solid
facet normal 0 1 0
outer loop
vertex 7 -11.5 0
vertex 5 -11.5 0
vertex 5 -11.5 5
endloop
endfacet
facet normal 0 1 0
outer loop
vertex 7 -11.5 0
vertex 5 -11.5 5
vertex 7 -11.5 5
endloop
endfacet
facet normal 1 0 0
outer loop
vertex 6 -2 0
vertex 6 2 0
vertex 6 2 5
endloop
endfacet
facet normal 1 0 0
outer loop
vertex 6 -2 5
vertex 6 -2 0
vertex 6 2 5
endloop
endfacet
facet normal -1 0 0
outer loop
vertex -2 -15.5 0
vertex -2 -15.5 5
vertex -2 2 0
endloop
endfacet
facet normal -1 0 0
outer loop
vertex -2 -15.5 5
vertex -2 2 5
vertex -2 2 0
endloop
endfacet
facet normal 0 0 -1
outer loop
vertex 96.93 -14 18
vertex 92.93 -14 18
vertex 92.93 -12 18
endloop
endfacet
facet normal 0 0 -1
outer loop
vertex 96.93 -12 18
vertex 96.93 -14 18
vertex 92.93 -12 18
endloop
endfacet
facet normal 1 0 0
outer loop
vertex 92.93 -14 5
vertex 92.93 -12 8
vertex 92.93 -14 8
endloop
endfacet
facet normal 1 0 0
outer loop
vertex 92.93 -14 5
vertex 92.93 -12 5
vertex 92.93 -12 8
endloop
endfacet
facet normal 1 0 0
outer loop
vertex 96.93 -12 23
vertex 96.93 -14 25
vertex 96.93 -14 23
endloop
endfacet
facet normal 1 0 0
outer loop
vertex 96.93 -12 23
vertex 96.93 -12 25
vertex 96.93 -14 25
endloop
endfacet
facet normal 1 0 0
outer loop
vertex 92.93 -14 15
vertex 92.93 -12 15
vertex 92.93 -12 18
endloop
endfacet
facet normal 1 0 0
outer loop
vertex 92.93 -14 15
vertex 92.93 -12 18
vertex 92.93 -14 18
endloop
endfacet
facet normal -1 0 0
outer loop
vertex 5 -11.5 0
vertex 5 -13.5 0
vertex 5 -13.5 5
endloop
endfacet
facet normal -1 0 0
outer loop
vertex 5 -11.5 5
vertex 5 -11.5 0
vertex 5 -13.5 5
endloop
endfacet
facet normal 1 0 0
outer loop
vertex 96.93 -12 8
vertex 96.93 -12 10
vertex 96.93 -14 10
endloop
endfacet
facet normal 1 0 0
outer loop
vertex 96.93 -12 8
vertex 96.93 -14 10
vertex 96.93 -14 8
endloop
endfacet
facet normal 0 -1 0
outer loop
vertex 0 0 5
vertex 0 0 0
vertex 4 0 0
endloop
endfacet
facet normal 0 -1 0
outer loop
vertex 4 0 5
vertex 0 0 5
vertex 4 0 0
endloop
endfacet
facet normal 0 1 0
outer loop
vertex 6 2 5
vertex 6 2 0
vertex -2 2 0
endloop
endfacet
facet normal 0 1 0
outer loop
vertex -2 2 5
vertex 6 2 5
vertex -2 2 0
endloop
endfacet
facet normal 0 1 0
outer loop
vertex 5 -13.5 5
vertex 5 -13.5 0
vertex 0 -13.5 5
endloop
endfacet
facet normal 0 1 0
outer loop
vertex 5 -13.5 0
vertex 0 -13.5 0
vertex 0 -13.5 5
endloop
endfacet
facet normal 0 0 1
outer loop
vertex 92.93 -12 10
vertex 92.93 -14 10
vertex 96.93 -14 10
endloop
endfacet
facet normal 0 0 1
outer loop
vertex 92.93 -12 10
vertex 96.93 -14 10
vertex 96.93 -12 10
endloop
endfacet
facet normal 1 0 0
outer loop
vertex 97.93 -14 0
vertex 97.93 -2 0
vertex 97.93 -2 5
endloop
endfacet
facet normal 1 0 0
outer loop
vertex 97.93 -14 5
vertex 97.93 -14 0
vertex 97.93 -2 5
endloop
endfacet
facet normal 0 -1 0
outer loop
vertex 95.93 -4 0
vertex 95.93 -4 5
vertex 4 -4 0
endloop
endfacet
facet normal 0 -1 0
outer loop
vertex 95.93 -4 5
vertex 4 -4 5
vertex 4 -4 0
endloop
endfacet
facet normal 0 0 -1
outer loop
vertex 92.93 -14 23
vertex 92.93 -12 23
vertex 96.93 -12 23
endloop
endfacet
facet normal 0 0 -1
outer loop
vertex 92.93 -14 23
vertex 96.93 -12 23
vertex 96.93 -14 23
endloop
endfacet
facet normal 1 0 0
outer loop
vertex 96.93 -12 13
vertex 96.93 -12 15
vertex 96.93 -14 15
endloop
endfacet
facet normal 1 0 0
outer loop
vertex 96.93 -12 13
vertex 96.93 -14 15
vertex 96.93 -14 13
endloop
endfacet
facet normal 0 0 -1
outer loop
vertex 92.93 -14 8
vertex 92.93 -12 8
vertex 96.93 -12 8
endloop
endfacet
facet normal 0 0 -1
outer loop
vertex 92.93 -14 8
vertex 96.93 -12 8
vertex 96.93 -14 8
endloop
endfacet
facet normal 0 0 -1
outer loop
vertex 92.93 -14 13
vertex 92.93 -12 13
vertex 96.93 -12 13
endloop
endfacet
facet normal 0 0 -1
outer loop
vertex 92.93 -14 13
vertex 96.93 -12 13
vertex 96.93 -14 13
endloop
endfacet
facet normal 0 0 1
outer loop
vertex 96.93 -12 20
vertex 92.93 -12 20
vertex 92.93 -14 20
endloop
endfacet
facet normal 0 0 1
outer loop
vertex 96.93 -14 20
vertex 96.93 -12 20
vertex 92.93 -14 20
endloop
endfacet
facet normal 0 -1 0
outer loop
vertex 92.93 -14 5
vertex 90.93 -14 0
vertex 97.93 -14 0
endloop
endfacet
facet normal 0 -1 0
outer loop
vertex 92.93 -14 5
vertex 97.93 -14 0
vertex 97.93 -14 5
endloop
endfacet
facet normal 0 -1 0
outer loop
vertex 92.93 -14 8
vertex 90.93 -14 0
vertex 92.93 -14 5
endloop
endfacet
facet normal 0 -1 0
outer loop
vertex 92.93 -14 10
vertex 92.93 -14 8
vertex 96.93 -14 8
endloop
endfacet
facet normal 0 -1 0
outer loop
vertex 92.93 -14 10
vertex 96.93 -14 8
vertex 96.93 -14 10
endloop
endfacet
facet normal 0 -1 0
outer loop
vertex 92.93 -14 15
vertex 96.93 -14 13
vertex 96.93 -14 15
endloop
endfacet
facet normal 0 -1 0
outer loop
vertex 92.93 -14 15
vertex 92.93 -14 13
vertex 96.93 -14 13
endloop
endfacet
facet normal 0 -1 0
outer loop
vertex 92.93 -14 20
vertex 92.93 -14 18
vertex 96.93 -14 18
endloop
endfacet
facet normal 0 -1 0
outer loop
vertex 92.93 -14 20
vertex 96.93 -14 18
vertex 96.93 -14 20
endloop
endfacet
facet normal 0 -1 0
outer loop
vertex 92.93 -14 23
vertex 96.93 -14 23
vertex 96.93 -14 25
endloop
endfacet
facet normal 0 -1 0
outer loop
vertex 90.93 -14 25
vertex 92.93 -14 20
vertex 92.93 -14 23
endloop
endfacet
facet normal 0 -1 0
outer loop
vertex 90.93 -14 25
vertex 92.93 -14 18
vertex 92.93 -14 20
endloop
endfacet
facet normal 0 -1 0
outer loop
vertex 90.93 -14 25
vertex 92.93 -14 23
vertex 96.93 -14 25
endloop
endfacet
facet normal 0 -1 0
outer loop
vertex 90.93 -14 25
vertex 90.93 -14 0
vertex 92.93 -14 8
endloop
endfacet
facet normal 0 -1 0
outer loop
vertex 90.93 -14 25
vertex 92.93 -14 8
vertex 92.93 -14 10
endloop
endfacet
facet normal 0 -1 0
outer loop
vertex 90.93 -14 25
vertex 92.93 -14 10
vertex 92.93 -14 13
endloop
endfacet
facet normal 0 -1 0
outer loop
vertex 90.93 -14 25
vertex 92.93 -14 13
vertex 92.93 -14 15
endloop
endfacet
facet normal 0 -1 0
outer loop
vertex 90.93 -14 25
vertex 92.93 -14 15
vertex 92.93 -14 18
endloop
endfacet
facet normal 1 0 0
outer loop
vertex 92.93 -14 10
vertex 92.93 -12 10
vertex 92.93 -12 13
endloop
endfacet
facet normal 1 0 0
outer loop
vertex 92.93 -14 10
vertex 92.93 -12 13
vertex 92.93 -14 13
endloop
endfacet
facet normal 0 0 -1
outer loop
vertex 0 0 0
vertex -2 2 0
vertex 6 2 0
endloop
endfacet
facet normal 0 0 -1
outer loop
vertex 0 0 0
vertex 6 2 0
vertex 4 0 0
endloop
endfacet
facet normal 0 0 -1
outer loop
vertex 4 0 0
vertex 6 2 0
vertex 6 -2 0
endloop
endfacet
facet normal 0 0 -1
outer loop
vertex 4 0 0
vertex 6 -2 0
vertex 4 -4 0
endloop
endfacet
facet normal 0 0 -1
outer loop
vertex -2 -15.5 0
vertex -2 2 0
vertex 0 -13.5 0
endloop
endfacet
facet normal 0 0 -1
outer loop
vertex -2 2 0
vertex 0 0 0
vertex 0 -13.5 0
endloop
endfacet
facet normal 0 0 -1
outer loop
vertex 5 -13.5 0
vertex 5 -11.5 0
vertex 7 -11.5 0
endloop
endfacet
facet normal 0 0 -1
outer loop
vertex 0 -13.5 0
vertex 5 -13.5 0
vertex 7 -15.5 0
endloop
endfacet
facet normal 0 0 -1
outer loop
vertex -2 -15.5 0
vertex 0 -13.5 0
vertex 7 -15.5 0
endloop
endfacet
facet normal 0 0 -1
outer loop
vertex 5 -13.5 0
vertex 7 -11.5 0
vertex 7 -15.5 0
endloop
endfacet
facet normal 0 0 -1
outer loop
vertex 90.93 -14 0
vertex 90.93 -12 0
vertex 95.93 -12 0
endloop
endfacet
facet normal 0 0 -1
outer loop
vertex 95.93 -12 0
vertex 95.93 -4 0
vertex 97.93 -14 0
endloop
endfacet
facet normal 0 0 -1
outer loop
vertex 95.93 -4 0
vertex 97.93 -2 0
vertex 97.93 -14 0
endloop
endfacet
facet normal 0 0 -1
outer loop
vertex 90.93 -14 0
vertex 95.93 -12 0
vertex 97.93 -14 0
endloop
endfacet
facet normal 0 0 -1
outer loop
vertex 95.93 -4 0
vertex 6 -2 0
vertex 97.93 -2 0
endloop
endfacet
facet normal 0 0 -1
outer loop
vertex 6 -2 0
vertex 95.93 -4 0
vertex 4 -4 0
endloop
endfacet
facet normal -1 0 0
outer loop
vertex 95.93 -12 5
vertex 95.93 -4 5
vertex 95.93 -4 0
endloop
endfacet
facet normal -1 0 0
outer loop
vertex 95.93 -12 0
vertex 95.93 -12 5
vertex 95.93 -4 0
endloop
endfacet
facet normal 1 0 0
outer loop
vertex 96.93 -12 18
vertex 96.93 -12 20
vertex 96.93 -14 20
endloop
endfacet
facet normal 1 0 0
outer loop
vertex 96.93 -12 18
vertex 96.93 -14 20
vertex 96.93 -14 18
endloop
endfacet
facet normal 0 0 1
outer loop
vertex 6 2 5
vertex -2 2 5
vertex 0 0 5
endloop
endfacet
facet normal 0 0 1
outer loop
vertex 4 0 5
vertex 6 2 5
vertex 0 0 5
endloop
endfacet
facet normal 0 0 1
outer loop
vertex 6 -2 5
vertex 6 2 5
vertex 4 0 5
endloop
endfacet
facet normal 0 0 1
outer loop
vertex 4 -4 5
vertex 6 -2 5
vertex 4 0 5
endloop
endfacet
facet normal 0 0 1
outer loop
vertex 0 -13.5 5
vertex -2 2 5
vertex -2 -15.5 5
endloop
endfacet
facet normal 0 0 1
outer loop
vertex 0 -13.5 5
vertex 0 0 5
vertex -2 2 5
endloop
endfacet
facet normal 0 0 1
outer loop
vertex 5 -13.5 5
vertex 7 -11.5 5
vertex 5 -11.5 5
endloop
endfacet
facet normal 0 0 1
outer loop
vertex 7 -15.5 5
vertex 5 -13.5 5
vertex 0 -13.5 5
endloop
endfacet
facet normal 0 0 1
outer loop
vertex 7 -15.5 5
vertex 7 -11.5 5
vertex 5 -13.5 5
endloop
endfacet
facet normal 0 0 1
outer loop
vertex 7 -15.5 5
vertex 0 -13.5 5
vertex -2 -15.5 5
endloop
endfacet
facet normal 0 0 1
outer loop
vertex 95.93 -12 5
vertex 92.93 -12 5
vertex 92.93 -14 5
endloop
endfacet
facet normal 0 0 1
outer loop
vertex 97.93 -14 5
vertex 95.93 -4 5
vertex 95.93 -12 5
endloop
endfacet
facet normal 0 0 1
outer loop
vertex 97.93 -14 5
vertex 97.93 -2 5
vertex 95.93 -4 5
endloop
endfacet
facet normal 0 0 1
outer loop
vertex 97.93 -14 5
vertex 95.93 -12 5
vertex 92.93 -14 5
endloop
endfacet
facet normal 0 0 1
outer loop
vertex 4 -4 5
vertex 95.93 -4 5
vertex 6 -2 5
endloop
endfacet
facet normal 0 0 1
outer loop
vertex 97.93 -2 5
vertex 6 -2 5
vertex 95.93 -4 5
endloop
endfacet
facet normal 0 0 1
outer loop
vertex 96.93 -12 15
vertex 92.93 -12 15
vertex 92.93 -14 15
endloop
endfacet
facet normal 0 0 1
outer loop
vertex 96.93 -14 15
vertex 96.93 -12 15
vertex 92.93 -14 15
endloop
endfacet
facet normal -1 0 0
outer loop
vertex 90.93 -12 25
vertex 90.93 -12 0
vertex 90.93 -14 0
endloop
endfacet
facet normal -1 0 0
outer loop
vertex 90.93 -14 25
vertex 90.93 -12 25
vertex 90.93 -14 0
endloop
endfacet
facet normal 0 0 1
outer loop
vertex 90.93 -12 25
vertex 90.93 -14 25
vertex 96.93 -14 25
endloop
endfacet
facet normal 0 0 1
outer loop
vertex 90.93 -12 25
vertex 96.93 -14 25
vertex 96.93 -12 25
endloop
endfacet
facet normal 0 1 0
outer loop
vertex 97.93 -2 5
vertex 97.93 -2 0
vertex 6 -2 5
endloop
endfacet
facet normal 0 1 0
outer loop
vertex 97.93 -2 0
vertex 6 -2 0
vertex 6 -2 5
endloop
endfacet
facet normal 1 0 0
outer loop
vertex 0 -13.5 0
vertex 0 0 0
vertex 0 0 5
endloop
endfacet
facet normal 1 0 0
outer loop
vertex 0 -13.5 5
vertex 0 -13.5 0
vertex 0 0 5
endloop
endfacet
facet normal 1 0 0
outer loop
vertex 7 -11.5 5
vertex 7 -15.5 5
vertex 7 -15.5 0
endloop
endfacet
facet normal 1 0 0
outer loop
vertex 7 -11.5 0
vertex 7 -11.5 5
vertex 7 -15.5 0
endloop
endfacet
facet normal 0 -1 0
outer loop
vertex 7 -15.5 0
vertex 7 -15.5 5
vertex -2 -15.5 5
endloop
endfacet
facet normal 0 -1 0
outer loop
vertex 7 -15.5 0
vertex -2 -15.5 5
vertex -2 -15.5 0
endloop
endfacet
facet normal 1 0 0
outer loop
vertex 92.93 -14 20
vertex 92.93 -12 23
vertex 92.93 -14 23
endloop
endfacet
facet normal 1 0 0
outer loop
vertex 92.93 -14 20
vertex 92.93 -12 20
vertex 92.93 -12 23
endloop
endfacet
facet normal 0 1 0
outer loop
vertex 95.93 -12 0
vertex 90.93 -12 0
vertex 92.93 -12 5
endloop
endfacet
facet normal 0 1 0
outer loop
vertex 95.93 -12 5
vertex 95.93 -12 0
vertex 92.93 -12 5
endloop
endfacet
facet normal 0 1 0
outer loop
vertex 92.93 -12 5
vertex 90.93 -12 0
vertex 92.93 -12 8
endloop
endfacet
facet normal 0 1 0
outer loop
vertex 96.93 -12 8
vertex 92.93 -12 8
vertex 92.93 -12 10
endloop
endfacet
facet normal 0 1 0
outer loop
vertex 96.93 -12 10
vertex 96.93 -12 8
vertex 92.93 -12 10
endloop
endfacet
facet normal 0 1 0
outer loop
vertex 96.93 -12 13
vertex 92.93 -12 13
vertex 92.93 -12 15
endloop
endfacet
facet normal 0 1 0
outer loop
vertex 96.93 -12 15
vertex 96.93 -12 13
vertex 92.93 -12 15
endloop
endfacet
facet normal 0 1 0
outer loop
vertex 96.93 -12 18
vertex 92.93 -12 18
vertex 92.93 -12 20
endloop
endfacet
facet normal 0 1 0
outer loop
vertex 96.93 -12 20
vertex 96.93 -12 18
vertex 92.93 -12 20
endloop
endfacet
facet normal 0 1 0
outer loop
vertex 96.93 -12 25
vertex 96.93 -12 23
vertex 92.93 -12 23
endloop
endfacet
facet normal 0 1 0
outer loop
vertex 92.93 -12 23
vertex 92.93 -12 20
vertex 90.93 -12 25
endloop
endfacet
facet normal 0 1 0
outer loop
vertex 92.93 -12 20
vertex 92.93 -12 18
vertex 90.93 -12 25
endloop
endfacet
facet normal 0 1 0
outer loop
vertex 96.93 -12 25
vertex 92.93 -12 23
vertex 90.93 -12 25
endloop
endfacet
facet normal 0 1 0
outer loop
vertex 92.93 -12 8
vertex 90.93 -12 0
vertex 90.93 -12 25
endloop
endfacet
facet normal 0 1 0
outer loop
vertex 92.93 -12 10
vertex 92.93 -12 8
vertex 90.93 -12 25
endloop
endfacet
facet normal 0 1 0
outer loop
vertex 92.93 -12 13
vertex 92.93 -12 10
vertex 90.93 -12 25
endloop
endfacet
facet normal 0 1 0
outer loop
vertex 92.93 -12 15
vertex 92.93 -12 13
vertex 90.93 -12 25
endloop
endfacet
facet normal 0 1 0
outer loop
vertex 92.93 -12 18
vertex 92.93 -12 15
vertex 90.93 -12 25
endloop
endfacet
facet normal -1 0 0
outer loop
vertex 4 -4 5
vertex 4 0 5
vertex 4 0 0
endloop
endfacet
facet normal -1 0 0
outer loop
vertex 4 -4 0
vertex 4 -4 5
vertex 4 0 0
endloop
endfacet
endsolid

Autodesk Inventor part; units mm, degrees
ref_plane "YZ Plane" through (0, 0, 0) normal (1, 0, 0) x (0, 1, 0)
ref_plane "XZ Plane" through (0, 0, 0) normal (0, 1, 0) x (-1, 0, 0)
ref_plane "XY Plane" through (0, 0, 0) normal (0, 0, 1) x (1, 0, 0)
sketch "Sketch1" plane through (0, 0, 0) normal (0, 0, 1) x (1, 0, 0)
  line L0 (0, 0) -> (6, 0)
  line L1 (6, 0) -> (6, 2)
  line L2 (6, 2) -> (0, 2)
  line L3 (0, 2) -> (0, 0)
  dimension "d0" = 6
  dimension "d1" = 2
extrude "Extrusion1" add sketch "Sketch1" along normal blind 5
sketch "Sketch2" plane through (0, 0, 0) normal (-1, 0, 0) x (0, 0, 1)
  line L0 (0, 2) -> (0, 0) projected
  line L1 (0, 0) -> (5, 0) projected
  line L2 (5, 2) -> (5, 0) projected
  line L3 (0, 2) -> (5, 2) projected
extrude "Extrusion2" add sketch "Sketch2" along normal blind 2
sketch "Sketch3" plane through (6, 0, 0) normal (0, -1, 0) x (1, 0, 0)
  line L0 (-8, 5) -> (-6, 5)
  line L1 (-6, 5) -> (-6, 0)
  line L2 (-6, 0) -> (-8, 0)
  line L3 (-8, 0) -> (-8, 5)
extrude "Extrusion3" add sketch "Sketch3" along normal blind 10.5
sketch "Sketch5" plane through (6, 0, 0) normal (0, -1, 0) x (1, 0, 0)
  line L0 (0, 5) -> (-8, 5) projected
  line L1 (0, 0) -> (-8, 0) projected
  line L2 (0, 5) -> (-2, 5)
  line L3 (-2, 5) -> (-2, 0)
  line L4 (-2, 0) -> (0, 0)
  line L5 (0, 0) -> (0, 5)
extrude "Extrusion5" add sketch "Sketch5" along normal blind 4
sketch "Sketch6" plane through (6, 2, 5) normal (1, 0, 0) x (0, 0, -1)
  line L0 (0, -6) -> (5, -6) projected
  line L1 (5, -2) -> (5, -12.5) projected
  line L2 (0, -6) -> (5, -6)
  line L3 (5, -6) -> (5, -4)
  line L4 (5, -4) -> (0, -4)
  line L5 (0, -4) -> (0, -6)
  dimension "d13" = 2
extrude "Extrusion6" add sketch "Sketch6" along normal blind 89.93
sketch "Sketch7" plane through (95.93, 2, 5) normal (1, 0, 0) x (0, 0, -1)
  line L0 (0, -6) -> (5, -6) projected
  line L1 (5, -6) -> (5, -4) projected
  line L2 (5, -4) -> (0, -4) projected
  line L3 (0, -4) -> (0, -6) projected
  point P0 (5, -2)
extrude "Extrusion7" add sketch "Sketch7" along normal blind 2
sketch "Sketch8" plane through (6, -4, 0) normal (0, -1, 0) x (1, 0, 0)
  line L0 (-2, 0) -> (91.93, 0) projected
  line L1 (91.93, 5) -> (89.93, 5)
  line L2 (89.93, 5) -> (89.93, 0)
  line L3 (89.93, 0) -> (91.93, 0)
  line L4 (91.93, 0) -> (91.93, 5)
  point P0 (-6, 0)
  dimension "d18" = 2
extrude "Extrusion8" add sketch "Sketch8" along normal blind 10
sketch "Sketch9" plane through (6, -10.5, 0) normal (0, -1, 0) x (1, 0, 0)
  line L0 (-6, 0) -> (-6, 5) projected
  line L1 (-6, 5) -> (-8, 5) projected
  line L2 (-8, 5) -> (-8, 0) projected
  line L3 (-8, 0) -> (-6, 0) projected
extrude "Extrusion9" add sketch "Sketch9" along normal blind 5
sketch "Sketch10" plane through (0, 0, 5) normal (1, 0, 0) x (0, 0, -1)
  line L0 (0, 2) -> (0, -15.5) projected
  line L1 (5, 2) -> (5, -15.5) projected
  line L2 (0, -15.5) -> (5, -15.5)
  line L3 (5, -15.5) -> (5, -13.5)
  line L4 (5, -13.5) -> (0, -13.5)
  line L5 (0, -13.5) -> (0, -15.5)
  dimension "d23" = 2
extrude "Extrusion10" add sketch "Sketch10" along normal blind 5
sketch "Sketch11" plane through (5, 0, 5) normal (1, 0, 0) x (0, 0, -1)
  line L0 (0, -15.5) -> (5, -15.5) projected
  line L1 (5, -15.5) -> (5, -13.5) projected
  line L2 (5, -13.5) -> (0, -13.5) projected
  line L3 (0, -13.5) -> (0, -15.5) projected
  point P0 (5, 0)
extrude "Extrusion11" add sketch "Sketch11" along normal blind 2
sketch "Sketch12" plane through (0, -13.5, 5) normal (0, 1, 0) x (1, 0, 0)
  line L0 (0, 0) -> (7, 0) projected
  line L1 (7, 5) -> (5, 5)
  line L2 (5, 5) -> (5, 0)
  line L3 (5, 0) -> (7, 0)
  line L4 (7, 0) -> (7, 5)
  dimension "d28" = 2
extrude "Extrusion12" add sketch "Sketch12" along normal blind 2
sketch "Sketch13" plane through (95.93, -4, 0) normal (-1, 0, 0) x (0, 0, 1)
  line L0 (5, 0) -> (5, -10) projected
  line L1 (0, -10) -> (5, -10)
  line L2 (5, -10) -> (5, -8)
  line L3 (5, -8) -> (0, -8)
  line L4 (0, -8) -> (0, -10)
  point P0 (0, 4)
  dimension "d31" = 2
extrude "Extrusion13" add sketch "Sketch13" along normal blind 5
sketch "Sketch14" plane through (0, 0, 5) normal (0, 0, 1) x (1, 0, 0)
  line L0 (97.93, -14) -> (90.93, -14) projected
  line L1 (90.93, -12) -> (92.93, -12)
  line L2 (92.93, -12) -> (92.93, -14)
  line L3 (92.93, -14) -> (90.93, -14)
  line L4 (90.93, -14) -> (90.93, -12)
  dimension "d34" = 2
extrude "Extrusion14" add sketch "Sketch14" along normal blind 5
sketch "Sketch15" plane through (92.93, -14, 5) normal (1, 0, 0) x (0, 0, -1)
  line L0 (0, 0) -> (-5, 0) projected
  line L1 (-5, 2) -> (-3, 2)
  line L2 (-3, 2) -> (-3, 0)
  line L3 (-3, 0) -> (-5, 0)
  line L4 (-5, 0) -> (-5, 2)
  point P0 (5, 14)
  dimension "d37" = 2
extrude "Extrusion15" add sketch "Sketch15" along normal blind 4
sketch "Sketch16" plane through (0, 0, 10) normal (0, 0, 1) x (1, 0, 0)
  line L0 (90.93, -12) -> (90.93, -14) projected
  line L1 (90.93, -14) -> (96.93, -14) projected
  line L2 (95.93, -12) -> (90.93, -12) projected
  line L3 (97.93, -14) -> (92.93, -14) projected
  line L4 (90.93, -12) -> (92.93, -12)
  line L5 (92.93, -12) -> (92.93, -14)
  line L6 (92.93, -14) -> (90.93, -14)
  line L7 (90.93, -14) -> (90.93, -12)
  point P0 (0, 0)
extrude "Extrusion16" add sketch "Sketch16" along normal blind 5
sketch "Sketch17" plane through (92.93, -14, 10) normal (1, 0, 0) x (0, 0, -1)
  line L0 (-5, 2) -> (-5, 0) projected
  line L1 (10, 0) -> (-5, 0) projected
  line L2 (-5, 2) -> (-3, 2)
  line L3 (-3, 2) -> (-3, 0)
  line L4 (-3, 0) -> (-5, 0)
  line L5 (-5, 0) -> (-5, 2)
  point P0 (10, 14)
  dimension "d42" = 2
extrude "Extrusion17" add sketch "Sketch17" along normal blind 4
sketch "Sketch18" plane through (0, 0, 15) normal (0, 0, 1) x (1, 0, 0)
  line L0 (90.93, -12) -> (90.93, -14) projected
  line L1 (90.93, -12) -> (90.93, -14) projected
  line L2 (97.93, -14) -> (90.93, -14) projected
  line L3 (90.93, -12) -> (92.93, -12)
  line L4 (92.93, -12) -> (92.93, -14)
  line L5 (92.93, -14) -> (90.93, -14)
  line L6 (90.93, -14) -> (90.93, -12)
  point P0 (0, 0)
  dimension "d45" = 2
extrude "Extrusion18" add sketch "Sketch18" along normal blind 10
sketch "Sketch19" plane through (92.93, -14, 15) normal (1, 0, 0) x (0, 0, -1)
  line L0 (15, 2) -> (-10, 2) projected
  line L1 (15, 0) -> (-10, 0) projected
  line L2 (-3, 2) -> (-5, 2)
  line L3 (-5, 2) -> (-5, 0)
  line L4 (-5, 0) -> (-3, 0)
  line L5 (-3, 0) -> (-3, 2)
  line L6 (0, 2) -> (0, 0) projected
  point P0 (15, 14)
  dimension "d48" = 2
  dimension "d51" = 3
extrude "Extrusion19" add sketch "Sketch19" along normal blind 4 contours L5 L1 L3 L0
sketch "Sketch20" plane through (92.93, -14, 25) normal (1, 0, 0) x (0, 0, -1)
  line L0 (25, 2) -> (0, 2) projected
  line L1 (25, 0) -> (0, 0) projected
  line L2 (0, 2) -> (2, 2)
  line L3 (2, 2) -> (2, 0)
  line L4 (2, 0) -> (0, 0)
  line L5 (0, 0) -> (0, 2)
  point P0 (25, 14)
  dimension "d52" = 2
extrude "Extrusion20" add sketch "Sketch20" along normal blind 4
properties part number "Steunbalk boven"
